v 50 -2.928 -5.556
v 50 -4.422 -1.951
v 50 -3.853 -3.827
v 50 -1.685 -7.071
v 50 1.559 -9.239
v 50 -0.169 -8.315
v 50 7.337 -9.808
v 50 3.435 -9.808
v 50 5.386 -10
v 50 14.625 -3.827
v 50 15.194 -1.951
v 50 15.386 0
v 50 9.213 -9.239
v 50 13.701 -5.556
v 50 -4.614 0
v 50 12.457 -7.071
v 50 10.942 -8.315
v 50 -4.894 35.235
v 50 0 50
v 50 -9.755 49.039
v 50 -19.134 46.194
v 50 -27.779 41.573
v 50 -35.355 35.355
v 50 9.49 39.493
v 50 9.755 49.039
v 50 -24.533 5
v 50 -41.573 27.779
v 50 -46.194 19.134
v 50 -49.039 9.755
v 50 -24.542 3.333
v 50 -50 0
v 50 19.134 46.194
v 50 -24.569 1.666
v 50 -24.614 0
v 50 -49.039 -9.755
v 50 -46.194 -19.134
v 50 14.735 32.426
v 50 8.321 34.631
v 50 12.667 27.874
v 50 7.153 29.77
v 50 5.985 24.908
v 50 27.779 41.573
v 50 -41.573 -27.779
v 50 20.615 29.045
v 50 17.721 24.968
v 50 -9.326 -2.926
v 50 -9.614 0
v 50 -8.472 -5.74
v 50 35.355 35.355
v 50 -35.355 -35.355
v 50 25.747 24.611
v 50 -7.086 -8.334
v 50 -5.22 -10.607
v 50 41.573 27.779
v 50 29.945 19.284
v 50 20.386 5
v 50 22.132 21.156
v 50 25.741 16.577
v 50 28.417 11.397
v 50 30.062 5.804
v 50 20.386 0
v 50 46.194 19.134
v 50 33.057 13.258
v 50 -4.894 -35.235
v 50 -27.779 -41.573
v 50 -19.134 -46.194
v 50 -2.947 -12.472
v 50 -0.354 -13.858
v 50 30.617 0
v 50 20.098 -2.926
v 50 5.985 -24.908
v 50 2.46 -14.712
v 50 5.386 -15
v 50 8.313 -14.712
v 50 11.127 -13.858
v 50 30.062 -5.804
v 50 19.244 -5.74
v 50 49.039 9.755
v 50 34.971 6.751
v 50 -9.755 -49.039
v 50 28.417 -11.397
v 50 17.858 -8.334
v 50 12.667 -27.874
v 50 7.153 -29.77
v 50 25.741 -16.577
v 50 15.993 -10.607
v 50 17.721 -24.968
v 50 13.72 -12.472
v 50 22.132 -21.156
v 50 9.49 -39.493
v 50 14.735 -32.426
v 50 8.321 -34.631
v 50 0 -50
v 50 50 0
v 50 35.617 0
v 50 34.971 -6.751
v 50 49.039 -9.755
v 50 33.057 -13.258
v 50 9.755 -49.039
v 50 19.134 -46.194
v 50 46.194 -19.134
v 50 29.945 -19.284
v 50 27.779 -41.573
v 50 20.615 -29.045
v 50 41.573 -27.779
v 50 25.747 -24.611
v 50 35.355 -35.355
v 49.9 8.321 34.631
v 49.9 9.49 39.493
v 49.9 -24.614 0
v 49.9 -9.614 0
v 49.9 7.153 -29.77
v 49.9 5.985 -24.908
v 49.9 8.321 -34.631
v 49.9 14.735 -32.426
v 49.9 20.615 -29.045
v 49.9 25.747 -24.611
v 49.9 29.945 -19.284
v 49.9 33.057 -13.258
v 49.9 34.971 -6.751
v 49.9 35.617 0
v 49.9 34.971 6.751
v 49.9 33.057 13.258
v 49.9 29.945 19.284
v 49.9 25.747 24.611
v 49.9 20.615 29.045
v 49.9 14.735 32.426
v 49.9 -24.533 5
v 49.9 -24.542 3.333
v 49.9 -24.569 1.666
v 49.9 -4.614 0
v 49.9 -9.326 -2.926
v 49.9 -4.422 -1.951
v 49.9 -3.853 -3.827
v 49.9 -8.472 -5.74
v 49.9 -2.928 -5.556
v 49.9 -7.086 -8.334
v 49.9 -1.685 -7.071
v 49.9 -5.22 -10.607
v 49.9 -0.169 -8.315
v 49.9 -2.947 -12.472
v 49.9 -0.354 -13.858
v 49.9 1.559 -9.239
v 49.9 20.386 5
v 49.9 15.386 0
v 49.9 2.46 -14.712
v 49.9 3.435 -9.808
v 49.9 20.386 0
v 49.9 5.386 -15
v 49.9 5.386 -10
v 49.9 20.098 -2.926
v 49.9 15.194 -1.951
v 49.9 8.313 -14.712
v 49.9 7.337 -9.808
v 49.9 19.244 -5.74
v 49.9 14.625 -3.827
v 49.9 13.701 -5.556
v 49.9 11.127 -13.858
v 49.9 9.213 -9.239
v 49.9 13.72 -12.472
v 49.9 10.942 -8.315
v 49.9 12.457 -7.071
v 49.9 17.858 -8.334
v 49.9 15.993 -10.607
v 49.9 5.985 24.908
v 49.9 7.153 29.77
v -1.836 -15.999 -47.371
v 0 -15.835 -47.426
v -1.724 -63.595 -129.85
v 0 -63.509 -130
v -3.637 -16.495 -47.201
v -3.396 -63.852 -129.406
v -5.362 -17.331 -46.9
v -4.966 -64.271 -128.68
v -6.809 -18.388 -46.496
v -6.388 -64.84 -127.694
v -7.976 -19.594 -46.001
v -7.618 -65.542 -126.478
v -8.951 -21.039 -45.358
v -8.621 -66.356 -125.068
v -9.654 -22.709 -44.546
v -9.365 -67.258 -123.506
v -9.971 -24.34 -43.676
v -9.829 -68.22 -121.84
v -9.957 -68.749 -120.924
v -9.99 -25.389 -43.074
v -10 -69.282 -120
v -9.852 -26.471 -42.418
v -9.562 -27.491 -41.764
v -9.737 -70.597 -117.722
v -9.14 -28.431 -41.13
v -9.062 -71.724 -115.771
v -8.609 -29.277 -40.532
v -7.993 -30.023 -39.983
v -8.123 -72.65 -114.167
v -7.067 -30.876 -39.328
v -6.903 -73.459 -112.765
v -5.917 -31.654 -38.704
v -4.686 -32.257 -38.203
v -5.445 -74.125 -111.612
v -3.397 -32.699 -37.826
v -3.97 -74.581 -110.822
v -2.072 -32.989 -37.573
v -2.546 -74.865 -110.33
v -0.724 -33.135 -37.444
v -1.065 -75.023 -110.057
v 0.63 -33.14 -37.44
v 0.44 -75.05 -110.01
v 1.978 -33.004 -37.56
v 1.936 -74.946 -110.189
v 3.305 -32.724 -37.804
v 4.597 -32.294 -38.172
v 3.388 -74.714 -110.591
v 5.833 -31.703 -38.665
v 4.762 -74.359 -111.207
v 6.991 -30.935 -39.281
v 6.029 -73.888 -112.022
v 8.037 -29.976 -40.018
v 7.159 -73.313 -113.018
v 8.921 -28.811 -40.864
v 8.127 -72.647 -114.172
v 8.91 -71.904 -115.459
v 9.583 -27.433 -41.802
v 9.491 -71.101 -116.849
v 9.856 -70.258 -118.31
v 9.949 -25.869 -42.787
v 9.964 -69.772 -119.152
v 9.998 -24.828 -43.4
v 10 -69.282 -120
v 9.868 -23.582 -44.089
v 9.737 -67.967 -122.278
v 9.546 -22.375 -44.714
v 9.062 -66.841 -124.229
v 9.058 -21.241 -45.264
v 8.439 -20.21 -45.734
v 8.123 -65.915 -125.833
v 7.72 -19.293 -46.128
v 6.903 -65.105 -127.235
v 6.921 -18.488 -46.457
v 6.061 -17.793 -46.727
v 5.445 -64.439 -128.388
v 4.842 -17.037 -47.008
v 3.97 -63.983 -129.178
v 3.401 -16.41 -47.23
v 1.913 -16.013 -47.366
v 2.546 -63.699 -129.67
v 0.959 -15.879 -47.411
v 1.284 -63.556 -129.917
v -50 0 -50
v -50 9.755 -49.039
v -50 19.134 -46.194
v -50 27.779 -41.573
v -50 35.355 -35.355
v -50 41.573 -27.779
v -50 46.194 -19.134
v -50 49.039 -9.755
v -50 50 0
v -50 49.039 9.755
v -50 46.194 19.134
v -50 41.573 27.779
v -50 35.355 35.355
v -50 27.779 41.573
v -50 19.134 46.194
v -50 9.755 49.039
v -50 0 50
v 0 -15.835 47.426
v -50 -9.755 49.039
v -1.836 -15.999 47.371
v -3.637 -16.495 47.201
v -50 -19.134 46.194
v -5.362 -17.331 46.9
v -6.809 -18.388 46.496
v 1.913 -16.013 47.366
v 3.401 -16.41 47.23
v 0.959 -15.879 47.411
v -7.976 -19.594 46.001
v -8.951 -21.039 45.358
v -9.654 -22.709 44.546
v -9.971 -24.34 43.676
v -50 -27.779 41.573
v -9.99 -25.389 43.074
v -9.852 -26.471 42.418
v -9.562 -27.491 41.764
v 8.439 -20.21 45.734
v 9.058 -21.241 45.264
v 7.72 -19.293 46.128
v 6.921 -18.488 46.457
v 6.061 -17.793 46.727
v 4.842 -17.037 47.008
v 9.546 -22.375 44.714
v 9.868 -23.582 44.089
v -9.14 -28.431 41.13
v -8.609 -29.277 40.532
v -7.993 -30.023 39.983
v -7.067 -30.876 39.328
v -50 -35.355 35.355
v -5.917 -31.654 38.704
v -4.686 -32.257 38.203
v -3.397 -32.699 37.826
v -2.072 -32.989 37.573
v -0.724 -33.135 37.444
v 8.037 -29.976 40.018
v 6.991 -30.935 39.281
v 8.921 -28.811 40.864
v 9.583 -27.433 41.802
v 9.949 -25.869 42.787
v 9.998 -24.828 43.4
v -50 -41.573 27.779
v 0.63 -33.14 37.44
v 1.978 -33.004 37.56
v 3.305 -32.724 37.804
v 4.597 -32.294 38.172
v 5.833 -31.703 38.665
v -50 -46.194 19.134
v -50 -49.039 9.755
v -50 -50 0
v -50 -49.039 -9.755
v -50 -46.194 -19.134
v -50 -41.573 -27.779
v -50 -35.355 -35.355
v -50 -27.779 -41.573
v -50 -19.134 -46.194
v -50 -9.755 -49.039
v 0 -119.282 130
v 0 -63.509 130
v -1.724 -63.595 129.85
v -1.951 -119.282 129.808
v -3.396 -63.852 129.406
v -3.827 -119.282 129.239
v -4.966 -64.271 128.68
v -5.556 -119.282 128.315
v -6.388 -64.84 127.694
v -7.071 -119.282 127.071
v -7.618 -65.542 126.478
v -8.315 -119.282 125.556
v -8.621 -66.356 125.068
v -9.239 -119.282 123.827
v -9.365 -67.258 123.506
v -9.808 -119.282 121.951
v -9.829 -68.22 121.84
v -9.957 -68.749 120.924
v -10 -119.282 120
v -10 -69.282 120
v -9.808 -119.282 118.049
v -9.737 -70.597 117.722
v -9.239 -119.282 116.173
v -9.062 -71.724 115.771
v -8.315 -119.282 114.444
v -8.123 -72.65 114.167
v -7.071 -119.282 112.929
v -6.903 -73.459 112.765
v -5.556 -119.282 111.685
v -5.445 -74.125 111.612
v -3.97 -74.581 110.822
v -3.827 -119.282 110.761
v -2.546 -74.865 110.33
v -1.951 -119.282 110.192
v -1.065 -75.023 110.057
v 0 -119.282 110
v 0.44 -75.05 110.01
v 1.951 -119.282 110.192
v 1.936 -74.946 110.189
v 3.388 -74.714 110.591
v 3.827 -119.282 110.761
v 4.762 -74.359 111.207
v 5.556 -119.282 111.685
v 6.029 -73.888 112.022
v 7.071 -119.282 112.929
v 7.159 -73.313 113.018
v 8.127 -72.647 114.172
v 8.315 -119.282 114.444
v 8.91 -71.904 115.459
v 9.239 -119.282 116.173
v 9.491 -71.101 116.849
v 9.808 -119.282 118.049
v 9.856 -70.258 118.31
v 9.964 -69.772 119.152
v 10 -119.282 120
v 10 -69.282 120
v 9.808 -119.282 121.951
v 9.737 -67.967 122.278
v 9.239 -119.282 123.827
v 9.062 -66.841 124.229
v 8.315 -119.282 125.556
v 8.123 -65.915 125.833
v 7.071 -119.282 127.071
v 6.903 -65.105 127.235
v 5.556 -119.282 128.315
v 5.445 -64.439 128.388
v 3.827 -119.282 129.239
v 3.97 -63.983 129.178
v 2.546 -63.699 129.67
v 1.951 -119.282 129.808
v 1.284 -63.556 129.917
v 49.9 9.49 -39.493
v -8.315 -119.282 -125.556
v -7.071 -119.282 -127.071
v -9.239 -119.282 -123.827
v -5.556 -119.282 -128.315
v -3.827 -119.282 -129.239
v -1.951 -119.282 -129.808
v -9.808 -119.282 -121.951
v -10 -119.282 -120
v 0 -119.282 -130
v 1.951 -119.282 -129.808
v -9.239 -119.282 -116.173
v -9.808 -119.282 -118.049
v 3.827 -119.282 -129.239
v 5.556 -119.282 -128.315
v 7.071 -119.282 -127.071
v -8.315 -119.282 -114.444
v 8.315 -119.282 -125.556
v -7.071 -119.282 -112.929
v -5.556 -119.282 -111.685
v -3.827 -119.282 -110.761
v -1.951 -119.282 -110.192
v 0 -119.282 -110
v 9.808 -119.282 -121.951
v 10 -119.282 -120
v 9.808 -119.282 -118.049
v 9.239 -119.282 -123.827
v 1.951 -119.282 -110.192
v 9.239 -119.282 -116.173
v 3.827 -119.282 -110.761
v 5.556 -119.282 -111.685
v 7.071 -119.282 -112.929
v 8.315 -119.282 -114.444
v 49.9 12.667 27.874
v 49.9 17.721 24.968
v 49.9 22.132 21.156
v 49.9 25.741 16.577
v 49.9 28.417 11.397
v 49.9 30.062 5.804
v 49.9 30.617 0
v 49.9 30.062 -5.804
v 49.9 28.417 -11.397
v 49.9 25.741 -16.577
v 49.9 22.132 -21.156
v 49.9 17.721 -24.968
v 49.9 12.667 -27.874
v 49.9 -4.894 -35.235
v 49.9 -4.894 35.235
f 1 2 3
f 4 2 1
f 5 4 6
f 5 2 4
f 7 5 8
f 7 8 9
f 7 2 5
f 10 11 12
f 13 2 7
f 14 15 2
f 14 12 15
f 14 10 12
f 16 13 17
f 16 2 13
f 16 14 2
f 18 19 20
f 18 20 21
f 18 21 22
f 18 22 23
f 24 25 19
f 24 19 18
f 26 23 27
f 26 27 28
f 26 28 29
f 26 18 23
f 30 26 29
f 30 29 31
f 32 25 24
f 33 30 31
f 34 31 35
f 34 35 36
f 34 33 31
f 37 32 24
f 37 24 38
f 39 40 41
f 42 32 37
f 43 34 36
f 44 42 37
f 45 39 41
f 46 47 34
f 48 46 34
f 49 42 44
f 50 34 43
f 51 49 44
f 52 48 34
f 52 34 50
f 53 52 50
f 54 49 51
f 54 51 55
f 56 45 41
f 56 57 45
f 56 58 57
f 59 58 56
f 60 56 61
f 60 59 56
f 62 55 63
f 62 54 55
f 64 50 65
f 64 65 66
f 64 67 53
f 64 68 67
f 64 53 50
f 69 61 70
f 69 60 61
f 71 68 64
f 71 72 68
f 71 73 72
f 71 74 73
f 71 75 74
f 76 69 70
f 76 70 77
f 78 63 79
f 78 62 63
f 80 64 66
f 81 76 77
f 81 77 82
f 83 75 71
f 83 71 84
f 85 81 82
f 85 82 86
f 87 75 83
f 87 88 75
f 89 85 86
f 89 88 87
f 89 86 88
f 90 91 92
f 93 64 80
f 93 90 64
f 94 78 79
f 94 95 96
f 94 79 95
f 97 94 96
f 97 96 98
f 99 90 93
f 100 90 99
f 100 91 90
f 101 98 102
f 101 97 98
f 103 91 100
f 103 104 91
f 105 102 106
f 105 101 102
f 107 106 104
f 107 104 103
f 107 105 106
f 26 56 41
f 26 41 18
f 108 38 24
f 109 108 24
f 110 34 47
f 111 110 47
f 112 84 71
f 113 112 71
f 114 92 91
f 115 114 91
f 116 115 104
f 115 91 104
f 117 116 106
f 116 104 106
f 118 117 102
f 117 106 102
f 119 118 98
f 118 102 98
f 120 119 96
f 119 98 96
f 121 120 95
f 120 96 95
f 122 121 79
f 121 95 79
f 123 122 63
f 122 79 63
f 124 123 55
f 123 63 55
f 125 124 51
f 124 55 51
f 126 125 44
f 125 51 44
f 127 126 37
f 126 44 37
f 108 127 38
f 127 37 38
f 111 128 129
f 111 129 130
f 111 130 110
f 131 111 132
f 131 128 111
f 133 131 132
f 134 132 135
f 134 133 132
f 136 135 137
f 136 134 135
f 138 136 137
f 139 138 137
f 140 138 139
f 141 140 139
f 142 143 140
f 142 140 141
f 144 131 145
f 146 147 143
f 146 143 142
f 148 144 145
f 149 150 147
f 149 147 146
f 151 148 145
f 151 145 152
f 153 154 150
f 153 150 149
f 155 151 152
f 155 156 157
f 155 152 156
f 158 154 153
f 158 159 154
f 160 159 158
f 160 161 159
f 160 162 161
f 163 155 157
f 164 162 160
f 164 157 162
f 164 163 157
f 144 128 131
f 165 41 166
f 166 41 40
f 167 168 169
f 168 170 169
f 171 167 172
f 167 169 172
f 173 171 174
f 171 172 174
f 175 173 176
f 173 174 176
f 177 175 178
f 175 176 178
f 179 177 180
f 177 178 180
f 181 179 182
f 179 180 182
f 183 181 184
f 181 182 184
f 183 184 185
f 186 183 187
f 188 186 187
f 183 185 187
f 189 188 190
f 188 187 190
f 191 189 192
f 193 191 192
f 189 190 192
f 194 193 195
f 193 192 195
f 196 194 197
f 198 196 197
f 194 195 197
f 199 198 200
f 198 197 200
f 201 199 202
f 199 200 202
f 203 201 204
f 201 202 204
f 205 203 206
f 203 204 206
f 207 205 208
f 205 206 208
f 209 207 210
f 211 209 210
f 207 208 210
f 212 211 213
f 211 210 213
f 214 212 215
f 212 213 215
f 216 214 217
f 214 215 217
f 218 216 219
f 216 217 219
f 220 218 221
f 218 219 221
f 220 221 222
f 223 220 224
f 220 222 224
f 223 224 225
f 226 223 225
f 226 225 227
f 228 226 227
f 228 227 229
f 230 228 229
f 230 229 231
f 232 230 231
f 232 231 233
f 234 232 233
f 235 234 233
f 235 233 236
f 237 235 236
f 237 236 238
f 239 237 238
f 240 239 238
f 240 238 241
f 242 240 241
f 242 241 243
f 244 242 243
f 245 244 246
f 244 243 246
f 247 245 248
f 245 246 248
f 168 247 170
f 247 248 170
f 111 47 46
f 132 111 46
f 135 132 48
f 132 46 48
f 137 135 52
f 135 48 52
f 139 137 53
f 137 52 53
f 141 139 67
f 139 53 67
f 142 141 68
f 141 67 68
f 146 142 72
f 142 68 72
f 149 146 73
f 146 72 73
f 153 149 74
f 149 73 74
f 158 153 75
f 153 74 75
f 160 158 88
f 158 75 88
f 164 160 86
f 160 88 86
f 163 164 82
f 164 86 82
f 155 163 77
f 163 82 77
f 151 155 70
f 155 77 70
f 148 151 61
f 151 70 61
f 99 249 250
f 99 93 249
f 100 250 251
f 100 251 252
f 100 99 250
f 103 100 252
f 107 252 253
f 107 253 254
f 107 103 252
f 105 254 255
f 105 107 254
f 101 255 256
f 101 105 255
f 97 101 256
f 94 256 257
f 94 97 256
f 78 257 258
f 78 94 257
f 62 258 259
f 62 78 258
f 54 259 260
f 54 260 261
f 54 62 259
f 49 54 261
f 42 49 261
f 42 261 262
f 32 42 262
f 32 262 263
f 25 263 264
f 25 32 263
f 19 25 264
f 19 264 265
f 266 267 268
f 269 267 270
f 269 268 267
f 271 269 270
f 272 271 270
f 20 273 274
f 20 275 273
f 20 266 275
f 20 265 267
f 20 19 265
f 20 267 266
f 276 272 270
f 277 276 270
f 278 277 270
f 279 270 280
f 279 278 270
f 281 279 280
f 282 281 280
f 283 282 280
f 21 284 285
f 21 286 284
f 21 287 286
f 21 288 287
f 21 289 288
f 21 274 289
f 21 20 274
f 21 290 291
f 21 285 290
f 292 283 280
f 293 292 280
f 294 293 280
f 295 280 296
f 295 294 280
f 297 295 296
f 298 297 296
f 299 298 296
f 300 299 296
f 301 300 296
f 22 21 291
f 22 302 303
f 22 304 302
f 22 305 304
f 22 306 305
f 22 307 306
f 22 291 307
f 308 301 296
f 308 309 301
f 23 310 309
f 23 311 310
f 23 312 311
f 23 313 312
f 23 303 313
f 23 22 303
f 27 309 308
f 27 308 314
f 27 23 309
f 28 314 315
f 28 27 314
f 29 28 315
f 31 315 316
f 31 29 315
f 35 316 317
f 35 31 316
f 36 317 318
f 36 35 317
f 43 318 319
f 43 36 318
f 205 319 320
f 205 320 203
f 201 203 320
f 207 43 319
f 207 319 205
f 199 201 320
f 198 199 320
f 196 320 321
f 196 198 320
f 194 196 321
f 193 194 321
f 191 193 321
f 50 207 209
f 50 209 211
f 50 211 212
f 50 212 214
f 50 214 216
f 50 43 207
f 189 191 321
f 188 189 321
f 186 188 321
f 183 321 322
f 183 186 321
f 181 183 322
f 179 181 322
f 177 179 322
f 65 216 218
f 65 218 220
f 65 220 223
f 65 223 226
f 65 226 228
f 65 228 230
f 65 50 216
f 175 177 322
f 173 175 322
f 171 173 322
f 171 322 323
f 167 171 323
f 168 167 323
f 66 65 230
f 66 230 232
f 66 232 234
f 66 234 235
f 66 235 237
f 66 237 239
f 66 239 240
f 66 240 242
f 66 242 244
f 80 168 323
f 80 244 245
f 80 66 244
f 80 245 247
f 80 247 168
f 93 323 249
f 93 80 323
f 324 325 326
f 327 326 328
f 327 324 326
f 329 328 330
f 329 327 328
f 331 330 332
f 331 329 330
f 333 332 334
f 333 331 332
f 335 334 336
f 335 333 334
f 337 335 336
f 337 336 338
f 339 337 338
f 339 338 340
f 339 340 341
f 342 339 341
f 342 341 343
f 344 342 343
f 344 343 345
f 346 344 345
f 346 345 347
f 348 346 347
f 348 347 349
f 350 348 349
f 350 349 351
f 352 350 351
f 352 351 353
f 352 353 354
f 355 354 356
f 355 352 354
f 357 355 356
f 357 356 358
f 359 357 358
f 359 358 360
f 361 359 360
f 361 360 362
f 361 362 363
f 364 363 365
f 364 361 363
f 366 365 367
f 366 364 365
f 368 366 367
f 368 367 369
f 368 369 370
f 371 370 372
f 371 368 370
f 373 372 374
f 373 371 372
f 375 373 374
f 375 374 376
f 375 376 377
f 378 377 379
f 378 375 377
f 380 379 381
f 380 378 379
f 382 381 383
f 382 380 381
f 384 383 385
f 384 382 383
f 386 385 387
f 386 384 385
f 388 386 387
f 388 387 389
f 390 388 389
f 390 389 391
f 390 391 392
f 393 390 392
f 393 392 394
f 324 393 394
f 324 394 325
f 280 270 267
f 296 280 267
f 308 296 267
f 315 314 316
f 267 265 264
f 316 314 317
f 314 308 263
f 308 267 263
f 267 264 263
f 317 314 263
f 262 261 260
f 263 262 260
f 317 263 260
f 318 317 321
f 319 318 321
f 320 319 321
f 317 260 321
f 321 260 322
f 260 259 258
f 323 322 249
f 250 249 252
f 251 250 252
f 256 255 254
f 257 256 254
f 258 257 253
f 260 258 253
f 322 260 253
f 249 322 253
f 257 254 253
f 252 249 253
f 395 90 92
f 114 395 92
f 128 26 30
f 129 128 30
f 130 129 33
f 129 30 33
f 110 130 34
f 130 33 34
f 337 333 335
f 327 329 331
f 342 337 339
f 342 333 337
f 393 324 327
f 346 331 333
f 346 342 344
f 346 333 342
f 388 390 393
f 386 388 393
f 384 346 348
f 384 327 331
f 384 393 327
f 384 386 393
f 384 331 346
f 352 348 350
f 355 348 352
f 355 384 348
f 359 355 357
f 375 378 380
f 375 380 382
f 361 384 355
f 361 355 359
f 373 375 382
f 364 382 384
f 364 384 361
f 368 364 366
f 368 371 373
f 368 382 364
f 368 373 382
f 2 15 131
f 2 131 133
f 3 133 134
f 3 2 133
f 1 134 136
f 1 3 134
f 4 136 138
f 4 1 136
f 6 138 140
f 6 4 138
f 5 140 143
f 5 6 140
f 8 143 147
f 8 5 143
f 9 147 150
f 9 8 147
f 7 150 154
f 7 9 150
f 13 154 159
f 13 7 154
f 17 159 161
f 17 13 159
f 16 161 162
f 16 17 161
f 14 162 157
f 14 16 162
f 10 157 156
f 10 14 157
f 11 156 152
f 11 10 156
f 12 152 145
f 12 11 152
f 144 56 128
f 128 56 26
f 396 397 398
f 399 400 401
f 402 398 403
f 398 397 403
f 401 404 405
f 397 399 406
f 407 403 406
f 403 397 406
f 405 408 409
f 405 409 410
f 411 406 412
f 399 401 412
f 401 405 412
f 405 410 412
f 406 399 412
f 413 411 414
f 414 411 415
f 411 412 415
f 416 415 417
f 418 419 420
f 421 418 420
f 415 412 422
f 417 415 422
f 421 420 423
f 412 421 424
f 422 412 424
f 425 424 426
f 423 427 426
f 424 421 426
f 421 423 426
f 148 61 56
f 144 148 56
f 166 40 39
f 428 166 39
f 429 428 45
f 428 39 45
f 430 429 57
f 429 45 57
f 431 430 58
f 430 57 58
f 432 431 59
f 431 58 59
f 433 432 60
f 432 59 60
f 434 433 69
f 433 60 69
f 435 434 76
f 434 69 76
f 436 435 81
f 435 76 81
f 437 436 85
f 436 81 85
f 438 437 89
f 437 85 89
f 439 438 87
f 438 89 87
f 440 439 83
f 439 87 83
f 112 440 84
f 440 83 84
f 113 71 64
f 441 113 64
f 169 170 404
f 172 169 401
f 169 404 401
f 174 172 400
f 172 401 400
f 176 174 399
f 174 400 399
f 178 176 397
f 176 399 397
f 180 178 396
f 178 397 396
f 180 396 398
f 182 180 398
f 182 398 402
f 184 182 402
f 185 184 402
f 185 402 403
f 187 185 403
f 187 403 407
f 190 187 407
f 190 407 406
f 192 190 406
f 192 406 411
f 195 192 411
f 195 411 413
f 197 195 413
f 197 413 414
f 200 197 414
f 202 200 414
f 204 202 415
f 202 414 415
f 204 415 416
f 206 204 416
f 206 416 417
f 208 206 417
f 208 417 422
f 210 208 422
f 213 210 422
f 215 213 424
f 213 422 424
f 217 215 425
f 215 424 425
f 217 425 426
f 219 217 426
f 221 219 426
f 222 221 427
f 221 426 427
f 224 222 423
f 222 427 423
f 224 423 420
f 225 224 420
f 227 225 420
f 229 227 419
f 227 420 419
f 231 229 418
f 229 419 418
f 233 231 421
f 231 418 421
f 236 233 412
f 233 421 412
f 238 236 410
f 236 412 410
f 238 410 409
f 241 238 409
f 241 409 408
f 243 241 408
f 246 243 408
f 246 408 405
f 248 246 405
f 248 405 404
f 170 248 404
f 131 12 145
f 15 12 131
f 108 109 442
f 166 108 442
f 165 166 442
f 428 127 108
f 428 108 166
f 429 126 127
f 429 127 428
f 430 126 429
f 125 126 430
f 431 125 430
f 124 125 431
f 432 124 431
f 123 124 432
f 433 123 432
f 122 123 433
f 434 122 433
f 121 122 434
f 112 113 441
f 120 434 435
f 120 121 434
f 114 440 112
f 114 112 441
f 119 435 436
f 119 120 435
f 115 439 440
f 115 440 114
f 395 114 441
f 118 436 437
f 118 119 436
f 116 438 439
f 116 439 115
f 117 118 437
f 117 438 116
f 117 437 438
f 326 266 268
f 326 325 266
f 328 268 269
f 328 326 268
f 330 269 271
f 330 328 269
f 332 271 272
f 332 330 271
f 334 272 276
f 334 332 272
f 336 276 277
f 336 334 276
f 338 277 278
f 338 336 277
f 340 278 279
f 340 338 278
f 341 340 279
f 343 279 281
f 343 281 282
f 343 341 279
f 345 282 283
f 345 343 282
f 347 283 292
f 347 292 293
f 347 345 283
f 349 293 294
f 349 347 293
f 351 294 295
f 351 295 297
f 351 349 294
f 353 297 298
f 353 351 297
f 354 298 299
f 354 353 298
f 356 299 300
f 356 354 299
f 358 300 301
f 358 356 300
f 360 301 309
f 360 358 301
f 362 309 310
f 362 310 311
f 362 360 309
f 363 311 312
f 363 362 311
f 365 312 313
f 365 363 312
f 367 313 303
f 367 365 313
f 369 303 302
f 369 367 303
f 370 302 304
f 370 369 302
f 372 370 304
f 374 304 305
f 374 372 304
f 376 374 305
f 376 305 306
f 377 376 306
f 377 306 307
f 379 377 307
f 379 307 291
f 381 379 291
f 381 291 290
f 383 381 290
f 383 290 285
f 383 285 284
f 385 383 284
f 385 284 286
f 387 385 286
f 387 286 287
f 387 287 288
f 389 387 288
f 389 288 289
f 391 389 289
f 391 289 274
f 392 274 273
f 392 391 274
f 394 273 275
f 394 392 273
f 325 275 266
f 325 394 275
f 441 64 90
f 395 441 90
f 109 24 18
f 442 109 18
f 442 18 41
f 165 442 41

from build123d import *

# Parameters (mm, degrees)
SKETCH1_R           = 50
BOSS_EXTRUDE1_DEPTH = 50
SWEEP1_PROFILE_R    = 10
CUT_EXTRUDE1_DEPTH  = 0.1


with BuildPart() as part:
    # Sketch1 → Boss-Extrude1 (new, symmetric)
    with BuildSketch(Plane(origin=(0, 0, 0), x_dir=(0, 0, -1), z_dir=(1, 0, 0))):
        Circle(SKETCH1_R)
    extrude(amount=BOSS_EXTRUDE1_DEPTH, both=True)

    # Sweep1: sweep along a path in Sketch2
    with BuildLine(Plane(origin=(0, 0, 0), x_dir=(0, 0, -1), z_dir=(1, 0, 0))) as sweep1_path:
        Line((0, 0), (-120, -69.282032303))
        Line((-120, -69.282032303), (-120, -119.282032303))
    # Sweep1 profile (on start of the path) → Sweep1 (sweep)
    with BuildSketch(Plane(origin=(0, 0, 0), x_dir=(0, 0.866025403784438, 0.5000000000000012), z_dir=(0, -0.5000000000000012, 0.866025403784438))):
        Circle(SWEEP1_PROFILE_R)
    sweep1 = sweep(path=sweep1_path.line, transition=Transition.RIGHT)

    # Mirror1: Sweep1 across plane
    add(sweep1.mirror(Plane.XY))

    # Sketch13 → Cut-Extrude1 (cut)
    # profile 1 of 2: a face of its own
    with BuildSketch(Plane(origin=(50, 0, 0), x_dir=(0, 0, -1), z_dir=(1, 0, 0))):
        with BuildLine():
            Line((-34.63127072, 8.321411489), (-39.492891462, 9.489591167))
            Line((-39.492891462, 9.489591167), (-35.235480182, -4.893539549))
            Line((-35.235480182, -4.893539549), (-24.908029236, 5.985052132))
            Line((-24.908029236, 5.985052132), (-29.769649978, 7.15323181))
            ThreePointArc((-29.769649978, 7.15323181), (0, 30.61700157), (29.769649978, 7.15323181))
            Line((29.769649978, 7.15323181), (24.908029236, 5.985052132))
            Line((24.908029236, 5.985052132), (35.235480182, -4.893539549))
            Line((35.235480182, -4.893539549), (39.492891462, 9.489591167))
            Line((39.492891462, 9.489591167), (34.63127072, 8.321411489))
            ThreePointArc((34.63127072, 8.321411489), (0, 35.61700157), (-34.63127072, 8.321411489))
        make_face()
    # profile 2 of 2: a face of its own
    with BuildSketch(Plane(origin=(50, 0, 0), x_dir=(0, 0, -1), z_dir=(1, 0, 0))):
        with BuildLine():
            Line((-5, 20.386275511), (-5, -24.532723242))
            ThreePointArc((-5, -24.532723242), (-2.499671961, -24.552974882), (0, -24.613724489))
            Line((0, -24.613724489), (0, -9.613724489))
            ThreePointArc((0, -9.613724489), (15, 5.386275511), (0, 20.386275511))
            Line((0, 20.386275511), (-5, 20.386275511))
        make_face()
        with BuildLine():
            Line((0, 15.386275511), (0, -4.613724489))
            ThreePointArc((0, -4.613724489), (10, 5.386275511), (0, 15.386275511))
        make_face(mode=Mode.SUBTRACT)
    extrude(amount=-CUT_EXTRUDE1_DEPTH, mode=Mode.SUBTRACT)


solid = part.part
